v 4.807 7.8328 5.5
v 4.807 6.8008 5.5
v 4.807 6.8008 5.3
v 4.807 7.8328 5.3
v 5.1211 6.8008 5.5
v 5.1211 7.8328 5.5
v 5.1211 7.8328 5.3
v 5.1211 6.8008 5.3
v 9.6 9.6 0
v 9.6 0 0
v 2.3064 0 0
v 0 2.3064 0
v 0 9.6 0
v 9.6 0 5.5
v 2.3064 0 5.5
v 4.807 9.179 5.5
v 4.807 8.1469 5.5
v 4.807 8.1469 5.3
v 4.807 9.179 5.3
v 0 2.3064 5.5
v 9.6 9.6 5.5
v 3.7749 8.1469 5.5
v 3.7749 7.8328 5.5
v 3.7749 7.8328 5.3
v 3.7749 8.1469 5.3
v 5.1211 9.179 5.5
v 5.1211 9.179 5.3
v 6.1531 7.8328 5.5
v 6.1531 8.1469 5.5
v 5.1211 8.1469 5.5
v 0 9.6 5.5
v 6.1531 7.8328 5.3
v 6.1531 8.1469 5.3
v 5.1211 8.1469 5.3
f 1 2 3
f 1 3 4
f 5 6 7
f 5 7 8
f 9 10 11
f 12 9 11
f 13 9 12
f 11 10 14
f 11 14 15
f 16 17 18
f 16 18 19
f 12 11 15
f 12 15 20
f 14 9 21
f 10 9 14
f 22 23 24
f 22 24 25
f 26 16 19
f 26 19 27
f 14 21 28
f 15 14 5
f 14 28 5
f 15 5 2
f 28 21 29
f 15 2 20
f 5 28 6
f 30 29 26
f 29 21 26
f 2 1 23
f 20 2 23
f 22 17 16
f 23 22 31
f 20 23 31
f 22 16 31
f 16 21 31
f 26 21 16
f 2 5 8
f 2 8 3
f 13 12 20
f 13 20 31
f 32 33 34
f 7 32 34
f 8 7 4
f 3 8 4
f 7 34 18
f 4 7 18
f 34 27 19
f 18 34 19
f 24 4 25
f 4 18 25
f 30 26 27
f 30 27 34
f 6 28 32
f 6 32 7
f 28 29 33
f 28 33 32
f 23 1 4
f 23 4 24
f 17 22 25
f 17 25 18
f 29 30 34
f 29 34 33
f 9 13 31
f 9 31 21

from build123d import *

# Parameters (mm, degrees)
BOSS_EXTRU_1_DEPTH      = 5.5
ENL_V_MAT_EXTRU_1_DEPTH = 0.2


with BuildPart() as part:
    # Esquisse3 → Boss.-Extru.1 (new body)
    with BuildSketch(Plane.XY):
        Polygon((0, 9.6), (9.6, 9.6), (9.6, 0), (2.306440558, 0), (0, 2.306440558), align=None)
    extrude(amount=BOSS_EXTRU_1_DEPTH)

    # Esquisse4 → Enlèv. mat.-Extru.1 (cut)
    with BuildSketch(Plane.XY.offset(5.5)):
        Polygon((4.806969946, 8.146939157), (4.806969946, 9.178990439), (5.12107251, 9.178990439), (5.12107251, 8.146939157), (6.153123792, 8.146939157), (6.153123792, 7.832836593), (5.12107251, 7.832836593), (5.12107251, 6.800785311), (4.806969946, 6.800785311), (4.806969946, 7.832836593), (3.774918664, 7.832836593), (3.774918664, 8.146939157), align=None)
    extrude(amount=-ENL_V_MAT_EXTRU_1_DEPTH, mode=Mode.SUBTRACT)


solid = part.part
